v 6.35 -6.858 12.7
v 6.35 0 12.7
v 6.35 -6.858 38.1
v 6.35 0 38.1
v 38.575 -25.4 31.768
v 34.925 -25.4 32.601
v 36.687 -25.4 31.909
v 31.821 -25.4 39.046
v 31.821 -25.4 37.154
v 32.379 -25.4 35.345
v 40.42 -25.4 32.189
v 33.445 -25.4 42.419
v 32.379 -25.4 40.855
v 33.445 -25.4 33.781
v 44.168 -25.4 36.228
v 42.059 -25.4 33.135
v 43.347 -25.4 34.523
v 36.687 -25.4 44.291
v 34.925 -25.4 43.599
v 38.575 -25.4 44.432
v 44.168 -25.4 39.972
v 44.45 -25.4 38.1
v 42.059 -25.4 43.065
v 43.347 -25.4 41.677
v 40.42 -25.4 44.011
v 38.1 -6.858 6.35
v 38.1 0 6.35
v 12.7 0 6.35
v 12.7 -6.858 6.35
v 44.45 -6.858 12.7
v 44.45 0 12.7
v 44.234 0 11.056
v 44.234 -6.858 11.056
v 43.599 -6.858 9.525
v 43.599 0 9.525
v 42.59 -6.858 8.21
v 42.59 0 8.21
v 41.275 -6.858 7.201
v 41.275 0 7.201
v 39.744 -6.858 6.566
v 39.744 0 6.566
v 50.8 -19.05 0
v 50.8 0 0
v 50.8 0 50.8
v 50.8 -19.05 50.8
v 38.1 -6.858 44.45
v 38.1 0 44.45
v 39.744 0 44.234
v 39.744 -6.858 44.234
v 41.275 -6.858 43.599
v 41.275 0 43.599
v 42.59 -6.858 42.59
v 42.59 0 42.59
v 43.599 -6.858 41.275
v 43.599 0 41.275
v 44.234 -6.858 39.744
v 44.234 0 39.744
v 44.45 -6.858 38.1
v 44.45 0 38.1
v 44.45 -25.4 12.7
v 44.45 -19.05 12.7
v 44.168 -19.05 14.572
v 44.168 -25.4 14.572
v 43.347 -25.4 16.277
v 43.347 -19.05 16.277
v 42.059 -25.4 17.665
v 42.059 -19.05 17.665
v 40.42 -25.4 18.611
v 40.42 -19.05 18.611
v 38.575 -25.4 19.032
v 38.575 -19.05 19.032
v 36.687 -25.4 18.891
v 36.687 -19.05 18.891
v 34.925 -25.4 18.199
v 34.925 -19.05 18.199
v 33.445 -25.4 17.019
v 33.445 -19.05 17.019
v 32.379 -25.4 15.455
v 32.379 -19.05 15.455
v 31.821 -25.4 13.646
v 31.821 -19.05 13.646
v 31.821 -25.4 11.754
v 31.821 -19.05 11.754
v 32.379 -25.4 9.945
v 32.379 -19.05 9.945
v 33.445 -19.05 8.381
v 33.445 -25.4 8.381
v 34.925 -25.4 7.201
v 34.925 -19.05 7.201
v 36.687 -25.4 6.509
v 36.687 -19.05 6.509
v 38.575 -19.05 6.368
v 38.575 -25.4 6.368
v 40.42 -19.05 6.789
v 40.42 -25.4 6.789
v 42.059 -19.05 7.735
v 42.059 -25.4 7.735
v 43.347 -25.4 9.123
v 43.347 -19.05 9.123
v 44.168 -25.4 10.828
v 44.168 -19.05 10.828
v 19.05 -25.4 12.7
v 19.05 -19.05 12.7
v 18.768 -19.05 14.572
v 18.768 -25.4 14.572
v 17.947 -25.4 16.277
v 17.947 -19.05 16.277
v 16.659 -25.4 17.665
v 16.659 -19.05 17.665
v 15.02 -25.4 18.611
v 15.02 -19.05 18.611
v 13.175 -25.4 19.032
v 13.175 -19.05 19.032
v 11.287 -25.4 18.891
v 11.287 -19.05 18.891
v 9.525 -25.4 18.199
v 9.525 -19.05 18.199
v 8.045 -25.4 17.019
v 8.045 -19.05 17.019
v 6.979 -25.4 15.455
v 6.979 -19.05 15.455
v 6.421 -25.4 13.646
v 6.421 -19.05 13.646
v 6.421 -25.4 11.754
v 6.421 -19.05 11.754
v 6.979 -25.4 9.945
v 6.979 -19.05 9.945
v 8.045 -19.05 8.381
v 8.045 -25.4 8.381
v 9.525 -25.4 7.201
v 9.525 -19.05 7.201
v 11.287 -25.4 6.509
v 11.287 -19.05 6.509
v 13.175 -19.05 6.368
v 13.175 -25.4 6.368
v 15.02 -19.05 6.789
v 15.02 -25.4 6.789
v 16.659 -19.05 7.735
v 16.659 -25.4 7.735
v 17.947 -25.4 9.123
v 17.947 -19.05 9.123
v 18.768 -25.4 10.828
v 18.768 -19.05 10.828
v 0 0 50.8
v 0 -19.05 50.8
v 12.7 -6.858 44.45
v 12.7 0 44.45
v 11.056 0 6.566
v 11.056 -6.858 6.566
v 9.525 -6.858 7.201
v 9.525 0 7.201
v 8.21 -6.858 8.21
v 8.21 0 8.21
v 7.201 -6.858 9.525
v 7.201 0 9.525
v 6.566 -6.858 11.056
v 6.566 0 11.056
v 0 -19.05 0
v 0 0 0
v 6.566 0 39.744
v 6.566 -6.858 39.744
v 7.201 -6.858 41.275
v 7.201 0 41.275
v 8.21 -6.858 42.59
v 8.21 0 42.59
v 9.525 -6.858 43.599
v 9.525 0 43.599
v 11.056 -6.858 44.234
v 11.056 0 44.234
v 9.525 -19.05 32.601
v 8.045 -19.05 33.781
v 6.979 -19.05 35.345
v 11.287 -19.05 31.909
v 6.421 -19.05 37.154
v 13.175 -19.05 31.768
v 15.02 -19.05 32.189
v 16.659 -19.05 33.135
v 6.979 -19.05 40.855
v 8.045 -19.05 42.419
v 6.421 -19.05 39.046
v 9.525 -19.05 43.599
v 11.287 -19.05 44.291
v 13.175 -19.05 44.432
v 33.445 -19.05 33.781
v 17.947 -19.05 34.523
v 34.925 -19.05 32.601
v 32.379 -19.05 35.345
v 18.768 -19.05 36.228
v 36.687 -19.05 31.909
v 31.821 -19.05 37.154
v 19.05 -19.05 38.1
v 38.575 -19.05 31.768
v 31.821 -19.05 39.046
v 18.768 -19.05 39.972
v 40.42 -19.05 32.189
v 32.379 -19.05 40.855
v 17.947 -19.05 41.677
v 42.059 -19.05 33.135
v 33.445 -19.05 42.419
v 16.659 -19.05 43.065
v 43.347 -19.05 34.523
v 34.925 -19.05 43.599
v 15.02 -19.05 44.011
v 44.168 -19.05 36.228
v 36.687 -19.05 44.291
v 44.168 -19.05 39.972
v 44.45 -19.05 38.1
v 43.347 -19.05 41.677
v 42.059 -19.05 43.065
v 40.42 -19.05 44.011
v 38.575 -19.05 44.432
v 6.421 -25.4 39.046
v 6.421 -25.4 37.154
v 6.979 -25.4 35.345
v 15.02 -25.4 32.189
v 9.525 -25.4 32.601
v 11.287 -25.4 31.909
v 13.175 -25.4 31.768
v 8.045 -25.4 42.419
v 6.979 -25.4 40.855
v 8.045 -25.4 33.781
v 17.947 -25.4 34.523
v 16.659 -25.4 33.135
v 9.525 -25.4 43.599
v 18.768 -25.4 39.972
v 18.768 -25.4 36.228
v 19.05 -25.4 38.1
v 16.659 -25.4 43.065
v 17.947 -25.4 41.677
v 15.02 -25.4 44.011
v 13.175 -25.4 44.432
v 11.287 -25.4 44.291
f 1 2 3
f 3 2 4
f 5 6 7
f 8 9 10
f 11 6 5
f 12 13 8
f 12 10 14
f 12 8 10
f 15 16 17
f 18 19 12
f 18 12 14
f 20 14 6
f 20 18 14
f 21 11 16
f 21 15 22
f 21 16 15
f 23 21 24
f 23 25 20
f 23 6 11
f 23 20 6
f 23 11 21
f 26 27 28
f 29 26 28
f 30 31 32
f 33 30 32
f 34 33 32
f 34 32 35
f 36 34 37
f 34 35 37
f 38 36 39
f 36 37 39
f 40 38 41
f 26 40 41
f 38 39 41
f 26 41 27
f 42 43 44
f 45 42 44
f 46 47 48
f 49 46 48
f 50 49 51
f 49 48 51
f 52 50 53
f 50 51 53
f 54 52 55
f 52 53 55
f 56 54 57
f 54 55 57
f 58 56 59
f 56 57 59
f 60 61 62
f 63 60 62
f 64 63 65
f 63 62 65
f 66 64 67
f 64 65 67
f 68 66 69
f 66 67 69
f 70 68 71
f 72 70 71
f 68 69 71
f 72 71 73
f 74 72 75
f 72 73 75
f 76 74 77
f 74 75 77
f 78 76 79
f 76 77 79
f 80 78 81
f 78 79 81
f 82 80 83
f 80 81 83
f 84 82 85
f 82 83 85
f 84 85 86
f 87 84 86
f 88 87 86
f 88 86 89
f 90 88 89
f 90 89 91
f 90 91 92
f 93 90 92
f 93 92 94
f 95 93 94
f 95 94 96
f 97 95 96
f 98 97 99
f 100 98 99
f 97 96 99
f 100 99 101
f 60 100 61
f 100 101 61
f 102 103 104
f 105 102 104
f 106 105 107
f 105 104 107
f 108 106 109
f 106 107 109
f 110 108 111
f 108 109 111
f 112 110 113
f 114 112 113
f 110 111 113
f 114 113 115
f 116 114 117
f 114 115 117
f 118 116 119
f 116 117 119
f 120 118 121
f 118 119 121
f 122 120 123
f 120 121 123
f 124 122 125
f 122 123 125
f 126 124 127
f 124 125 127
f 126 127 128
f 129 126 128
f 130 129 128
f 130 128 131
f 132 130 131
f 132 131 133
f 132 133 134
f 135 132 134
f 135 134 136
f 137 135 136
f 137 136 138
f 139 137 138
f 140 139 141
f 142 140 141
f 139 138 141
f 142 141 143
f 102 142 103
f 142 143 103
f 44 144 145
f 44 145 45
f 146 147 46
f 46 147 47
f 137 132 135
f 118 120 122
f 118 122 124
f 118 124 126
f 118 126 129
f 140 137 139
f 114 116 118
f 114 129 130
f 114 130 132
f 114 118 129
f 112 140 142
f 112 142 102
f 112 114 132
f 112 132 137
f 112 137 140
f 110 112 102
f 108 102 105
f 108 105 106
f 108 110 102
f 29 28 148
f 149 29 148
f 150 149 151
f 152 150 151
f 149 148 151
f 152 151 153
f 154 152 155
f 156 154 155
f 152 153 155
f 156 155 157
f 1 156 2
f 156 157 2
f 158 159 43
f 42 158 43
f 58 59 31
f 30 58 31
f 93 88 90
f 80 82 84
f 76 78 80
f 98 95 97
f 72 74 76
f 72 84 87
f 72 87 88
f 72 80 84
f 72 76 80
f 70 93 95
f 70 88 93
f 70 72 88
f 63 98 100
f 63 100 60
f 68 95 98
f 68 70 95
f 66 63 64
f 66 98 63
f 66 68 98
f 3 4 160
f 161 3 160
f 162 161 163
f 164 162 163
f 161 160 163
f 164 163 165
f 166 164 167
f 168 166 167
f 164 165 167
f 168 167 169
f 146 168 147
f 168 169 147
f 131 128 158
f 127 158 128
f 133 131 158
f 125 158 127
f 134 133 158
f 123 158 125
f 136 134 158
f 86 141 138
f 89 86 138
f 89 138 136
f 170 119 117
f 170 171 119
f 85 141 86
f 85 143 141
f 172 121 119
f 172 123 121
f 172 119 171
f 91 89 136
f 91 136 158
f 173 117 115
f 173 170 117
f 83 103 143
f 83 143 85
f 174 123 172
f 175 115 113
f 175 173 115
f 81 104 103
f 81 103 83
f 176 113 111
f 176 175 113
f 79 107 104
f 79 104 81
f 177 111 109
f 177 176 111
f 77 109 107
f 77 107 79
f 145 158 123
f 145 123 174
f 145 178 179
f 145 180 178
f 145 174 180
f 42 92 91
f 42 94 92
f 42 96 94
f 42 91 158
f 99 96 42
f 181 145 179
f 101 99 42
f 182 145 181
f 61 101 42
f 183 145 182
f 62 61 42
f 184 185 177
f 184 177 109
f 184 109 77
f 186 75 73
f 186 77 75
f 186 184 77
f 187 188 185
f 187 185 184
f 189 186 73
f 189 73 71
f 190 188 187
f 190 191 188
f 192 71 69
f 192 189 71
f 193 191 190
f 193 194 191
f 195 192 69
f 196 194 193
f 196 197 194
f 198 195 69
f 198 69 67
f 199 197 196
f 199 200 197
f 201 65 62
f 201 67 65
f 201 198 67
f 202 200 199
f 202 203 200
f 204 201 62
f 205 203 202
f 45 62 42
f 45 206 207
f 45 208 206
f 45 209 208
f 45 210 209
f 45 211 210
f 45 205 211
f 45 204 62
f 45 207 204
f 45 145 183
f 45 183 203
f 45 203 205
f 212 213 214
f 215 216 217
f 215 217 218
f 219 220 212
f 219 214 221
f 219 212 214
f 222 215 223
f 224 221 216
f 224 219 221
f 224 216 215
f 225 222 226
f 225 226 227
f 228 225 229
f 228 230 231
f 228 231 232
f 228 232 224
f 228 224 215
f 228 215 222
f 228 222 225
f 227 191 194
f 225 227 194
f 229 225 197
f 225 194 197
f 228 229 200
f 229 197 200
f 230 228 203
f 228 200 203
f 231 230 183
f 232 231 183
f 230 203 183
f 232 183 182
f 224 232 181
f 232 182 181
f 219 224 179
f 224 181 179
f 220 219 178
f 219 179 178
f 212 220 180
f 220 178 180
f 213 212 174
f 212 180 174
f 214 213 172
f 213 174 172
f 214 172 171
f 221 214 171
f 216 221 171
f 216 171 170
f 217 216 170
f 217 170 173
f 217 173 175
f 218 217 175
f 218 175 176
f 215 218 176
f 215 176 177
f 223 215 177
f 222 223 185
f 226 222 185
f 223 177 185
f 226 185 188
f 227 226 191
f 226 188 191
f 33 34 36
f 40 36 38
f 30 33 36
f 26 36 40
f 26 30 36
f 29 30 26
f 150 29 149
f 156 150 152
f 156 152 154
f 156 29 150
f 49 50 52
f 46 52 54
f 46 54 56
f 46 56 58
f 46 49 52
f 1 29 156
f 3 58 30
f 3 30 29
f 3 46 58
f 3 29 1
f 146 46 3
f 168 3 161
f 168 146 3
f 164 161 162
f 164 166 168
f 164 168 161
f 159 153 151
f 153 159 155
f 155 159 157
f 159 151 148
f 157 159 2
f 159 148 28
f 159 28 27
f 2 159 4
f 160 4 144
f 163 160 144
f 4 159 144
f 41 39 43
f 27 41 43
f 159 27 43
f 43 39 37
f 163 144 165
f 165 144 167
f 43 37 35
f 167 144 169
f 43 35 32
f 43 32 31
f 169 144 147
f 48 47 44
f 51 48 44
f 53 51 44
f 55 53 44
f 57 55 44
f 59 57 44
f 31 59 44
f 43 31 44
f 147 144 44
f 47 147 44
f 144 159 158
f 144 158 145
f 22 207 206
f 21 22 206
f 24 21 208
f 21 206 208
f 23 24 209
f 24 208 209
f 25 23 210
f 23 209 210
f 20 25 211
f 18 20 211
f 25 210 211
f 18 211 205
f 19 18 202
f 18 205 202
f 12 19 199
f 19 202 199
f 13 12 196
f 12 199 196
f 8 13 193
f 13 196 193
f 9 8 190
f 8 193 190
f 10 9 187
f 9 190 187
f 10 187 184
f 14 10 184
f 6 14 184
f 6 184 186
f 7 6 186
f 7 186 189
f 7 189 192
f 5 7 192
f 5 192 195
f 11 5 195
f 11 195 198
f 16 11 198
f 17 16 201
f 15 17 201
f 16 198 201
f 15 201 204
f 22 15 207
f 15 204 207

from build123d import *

# Parameters (mm, degrees)
F0_W     = 50.8
F0_H     = 50.8
F1_DEPTH = 19.05
F2_R     = 6.35
F3_DEPTH = 6.35
F5_DEPTH = 6.858


with BuildPart() as f1:
    # F0 (on Front) → F1 (new body)
    with BuildSketch(Plane.XZ):
        with Locations((25.4, 25.4)):
            Rectangle(F0_W, F0_H)
    extrude(amount=F1_DEPTH)

    # F2 (on face) → F3 (join)
    with BuildSketch(Plane.XZ.offset(19.05)):
        with Locations((12.7, 38.1)):
            Circle(F2_R)
        with Locations((38.1, 38.1)):
            Circle(F2_R)
        with Locations((12.7, 12.7)):
            Circle(F2_R)
        with Locations((38.1, 12.7)):
            Circle(F2_R)
    extrude(amount=F3_DEPTH)

    # F4 (on face) → F5 (cut)
    with BuildSketch(Plane(origin=(0, 0, 0), x_dir=(-1, 0, 0), z_dir=(0, 1, 0))):
        with BuildLine():
            Line((-12.7, 44.45), (-38.1, 44.45))
            ThreePointArc((-38.1, 44.45), (-42.590128, 42.590128), (-44.45, 38.1))
            Line((-44.45, 38.1), (-44.45, 12.7))
            ThreePointArc((-44.45, 12.7), (-42.590128, 8.209872), (-38.1, 6.35))
            Line((-38.1, 6.35), (-12.7, 6.35))
            ThreePointArc((-12.7, 6.35), (-8.209872, 8.209872), (-6.35, 12.7))
            Line((-6.35, 12.7), (-6.35, 38.1))
            ThreePointArc((-6.35, 38.1), (-8.209872, 42.590128), (-12.7, 44.45))
        make_face()
    extrude(amount=-F5_DEPTH, mode=Mode.SUBTRACT)


solid = f1.part
